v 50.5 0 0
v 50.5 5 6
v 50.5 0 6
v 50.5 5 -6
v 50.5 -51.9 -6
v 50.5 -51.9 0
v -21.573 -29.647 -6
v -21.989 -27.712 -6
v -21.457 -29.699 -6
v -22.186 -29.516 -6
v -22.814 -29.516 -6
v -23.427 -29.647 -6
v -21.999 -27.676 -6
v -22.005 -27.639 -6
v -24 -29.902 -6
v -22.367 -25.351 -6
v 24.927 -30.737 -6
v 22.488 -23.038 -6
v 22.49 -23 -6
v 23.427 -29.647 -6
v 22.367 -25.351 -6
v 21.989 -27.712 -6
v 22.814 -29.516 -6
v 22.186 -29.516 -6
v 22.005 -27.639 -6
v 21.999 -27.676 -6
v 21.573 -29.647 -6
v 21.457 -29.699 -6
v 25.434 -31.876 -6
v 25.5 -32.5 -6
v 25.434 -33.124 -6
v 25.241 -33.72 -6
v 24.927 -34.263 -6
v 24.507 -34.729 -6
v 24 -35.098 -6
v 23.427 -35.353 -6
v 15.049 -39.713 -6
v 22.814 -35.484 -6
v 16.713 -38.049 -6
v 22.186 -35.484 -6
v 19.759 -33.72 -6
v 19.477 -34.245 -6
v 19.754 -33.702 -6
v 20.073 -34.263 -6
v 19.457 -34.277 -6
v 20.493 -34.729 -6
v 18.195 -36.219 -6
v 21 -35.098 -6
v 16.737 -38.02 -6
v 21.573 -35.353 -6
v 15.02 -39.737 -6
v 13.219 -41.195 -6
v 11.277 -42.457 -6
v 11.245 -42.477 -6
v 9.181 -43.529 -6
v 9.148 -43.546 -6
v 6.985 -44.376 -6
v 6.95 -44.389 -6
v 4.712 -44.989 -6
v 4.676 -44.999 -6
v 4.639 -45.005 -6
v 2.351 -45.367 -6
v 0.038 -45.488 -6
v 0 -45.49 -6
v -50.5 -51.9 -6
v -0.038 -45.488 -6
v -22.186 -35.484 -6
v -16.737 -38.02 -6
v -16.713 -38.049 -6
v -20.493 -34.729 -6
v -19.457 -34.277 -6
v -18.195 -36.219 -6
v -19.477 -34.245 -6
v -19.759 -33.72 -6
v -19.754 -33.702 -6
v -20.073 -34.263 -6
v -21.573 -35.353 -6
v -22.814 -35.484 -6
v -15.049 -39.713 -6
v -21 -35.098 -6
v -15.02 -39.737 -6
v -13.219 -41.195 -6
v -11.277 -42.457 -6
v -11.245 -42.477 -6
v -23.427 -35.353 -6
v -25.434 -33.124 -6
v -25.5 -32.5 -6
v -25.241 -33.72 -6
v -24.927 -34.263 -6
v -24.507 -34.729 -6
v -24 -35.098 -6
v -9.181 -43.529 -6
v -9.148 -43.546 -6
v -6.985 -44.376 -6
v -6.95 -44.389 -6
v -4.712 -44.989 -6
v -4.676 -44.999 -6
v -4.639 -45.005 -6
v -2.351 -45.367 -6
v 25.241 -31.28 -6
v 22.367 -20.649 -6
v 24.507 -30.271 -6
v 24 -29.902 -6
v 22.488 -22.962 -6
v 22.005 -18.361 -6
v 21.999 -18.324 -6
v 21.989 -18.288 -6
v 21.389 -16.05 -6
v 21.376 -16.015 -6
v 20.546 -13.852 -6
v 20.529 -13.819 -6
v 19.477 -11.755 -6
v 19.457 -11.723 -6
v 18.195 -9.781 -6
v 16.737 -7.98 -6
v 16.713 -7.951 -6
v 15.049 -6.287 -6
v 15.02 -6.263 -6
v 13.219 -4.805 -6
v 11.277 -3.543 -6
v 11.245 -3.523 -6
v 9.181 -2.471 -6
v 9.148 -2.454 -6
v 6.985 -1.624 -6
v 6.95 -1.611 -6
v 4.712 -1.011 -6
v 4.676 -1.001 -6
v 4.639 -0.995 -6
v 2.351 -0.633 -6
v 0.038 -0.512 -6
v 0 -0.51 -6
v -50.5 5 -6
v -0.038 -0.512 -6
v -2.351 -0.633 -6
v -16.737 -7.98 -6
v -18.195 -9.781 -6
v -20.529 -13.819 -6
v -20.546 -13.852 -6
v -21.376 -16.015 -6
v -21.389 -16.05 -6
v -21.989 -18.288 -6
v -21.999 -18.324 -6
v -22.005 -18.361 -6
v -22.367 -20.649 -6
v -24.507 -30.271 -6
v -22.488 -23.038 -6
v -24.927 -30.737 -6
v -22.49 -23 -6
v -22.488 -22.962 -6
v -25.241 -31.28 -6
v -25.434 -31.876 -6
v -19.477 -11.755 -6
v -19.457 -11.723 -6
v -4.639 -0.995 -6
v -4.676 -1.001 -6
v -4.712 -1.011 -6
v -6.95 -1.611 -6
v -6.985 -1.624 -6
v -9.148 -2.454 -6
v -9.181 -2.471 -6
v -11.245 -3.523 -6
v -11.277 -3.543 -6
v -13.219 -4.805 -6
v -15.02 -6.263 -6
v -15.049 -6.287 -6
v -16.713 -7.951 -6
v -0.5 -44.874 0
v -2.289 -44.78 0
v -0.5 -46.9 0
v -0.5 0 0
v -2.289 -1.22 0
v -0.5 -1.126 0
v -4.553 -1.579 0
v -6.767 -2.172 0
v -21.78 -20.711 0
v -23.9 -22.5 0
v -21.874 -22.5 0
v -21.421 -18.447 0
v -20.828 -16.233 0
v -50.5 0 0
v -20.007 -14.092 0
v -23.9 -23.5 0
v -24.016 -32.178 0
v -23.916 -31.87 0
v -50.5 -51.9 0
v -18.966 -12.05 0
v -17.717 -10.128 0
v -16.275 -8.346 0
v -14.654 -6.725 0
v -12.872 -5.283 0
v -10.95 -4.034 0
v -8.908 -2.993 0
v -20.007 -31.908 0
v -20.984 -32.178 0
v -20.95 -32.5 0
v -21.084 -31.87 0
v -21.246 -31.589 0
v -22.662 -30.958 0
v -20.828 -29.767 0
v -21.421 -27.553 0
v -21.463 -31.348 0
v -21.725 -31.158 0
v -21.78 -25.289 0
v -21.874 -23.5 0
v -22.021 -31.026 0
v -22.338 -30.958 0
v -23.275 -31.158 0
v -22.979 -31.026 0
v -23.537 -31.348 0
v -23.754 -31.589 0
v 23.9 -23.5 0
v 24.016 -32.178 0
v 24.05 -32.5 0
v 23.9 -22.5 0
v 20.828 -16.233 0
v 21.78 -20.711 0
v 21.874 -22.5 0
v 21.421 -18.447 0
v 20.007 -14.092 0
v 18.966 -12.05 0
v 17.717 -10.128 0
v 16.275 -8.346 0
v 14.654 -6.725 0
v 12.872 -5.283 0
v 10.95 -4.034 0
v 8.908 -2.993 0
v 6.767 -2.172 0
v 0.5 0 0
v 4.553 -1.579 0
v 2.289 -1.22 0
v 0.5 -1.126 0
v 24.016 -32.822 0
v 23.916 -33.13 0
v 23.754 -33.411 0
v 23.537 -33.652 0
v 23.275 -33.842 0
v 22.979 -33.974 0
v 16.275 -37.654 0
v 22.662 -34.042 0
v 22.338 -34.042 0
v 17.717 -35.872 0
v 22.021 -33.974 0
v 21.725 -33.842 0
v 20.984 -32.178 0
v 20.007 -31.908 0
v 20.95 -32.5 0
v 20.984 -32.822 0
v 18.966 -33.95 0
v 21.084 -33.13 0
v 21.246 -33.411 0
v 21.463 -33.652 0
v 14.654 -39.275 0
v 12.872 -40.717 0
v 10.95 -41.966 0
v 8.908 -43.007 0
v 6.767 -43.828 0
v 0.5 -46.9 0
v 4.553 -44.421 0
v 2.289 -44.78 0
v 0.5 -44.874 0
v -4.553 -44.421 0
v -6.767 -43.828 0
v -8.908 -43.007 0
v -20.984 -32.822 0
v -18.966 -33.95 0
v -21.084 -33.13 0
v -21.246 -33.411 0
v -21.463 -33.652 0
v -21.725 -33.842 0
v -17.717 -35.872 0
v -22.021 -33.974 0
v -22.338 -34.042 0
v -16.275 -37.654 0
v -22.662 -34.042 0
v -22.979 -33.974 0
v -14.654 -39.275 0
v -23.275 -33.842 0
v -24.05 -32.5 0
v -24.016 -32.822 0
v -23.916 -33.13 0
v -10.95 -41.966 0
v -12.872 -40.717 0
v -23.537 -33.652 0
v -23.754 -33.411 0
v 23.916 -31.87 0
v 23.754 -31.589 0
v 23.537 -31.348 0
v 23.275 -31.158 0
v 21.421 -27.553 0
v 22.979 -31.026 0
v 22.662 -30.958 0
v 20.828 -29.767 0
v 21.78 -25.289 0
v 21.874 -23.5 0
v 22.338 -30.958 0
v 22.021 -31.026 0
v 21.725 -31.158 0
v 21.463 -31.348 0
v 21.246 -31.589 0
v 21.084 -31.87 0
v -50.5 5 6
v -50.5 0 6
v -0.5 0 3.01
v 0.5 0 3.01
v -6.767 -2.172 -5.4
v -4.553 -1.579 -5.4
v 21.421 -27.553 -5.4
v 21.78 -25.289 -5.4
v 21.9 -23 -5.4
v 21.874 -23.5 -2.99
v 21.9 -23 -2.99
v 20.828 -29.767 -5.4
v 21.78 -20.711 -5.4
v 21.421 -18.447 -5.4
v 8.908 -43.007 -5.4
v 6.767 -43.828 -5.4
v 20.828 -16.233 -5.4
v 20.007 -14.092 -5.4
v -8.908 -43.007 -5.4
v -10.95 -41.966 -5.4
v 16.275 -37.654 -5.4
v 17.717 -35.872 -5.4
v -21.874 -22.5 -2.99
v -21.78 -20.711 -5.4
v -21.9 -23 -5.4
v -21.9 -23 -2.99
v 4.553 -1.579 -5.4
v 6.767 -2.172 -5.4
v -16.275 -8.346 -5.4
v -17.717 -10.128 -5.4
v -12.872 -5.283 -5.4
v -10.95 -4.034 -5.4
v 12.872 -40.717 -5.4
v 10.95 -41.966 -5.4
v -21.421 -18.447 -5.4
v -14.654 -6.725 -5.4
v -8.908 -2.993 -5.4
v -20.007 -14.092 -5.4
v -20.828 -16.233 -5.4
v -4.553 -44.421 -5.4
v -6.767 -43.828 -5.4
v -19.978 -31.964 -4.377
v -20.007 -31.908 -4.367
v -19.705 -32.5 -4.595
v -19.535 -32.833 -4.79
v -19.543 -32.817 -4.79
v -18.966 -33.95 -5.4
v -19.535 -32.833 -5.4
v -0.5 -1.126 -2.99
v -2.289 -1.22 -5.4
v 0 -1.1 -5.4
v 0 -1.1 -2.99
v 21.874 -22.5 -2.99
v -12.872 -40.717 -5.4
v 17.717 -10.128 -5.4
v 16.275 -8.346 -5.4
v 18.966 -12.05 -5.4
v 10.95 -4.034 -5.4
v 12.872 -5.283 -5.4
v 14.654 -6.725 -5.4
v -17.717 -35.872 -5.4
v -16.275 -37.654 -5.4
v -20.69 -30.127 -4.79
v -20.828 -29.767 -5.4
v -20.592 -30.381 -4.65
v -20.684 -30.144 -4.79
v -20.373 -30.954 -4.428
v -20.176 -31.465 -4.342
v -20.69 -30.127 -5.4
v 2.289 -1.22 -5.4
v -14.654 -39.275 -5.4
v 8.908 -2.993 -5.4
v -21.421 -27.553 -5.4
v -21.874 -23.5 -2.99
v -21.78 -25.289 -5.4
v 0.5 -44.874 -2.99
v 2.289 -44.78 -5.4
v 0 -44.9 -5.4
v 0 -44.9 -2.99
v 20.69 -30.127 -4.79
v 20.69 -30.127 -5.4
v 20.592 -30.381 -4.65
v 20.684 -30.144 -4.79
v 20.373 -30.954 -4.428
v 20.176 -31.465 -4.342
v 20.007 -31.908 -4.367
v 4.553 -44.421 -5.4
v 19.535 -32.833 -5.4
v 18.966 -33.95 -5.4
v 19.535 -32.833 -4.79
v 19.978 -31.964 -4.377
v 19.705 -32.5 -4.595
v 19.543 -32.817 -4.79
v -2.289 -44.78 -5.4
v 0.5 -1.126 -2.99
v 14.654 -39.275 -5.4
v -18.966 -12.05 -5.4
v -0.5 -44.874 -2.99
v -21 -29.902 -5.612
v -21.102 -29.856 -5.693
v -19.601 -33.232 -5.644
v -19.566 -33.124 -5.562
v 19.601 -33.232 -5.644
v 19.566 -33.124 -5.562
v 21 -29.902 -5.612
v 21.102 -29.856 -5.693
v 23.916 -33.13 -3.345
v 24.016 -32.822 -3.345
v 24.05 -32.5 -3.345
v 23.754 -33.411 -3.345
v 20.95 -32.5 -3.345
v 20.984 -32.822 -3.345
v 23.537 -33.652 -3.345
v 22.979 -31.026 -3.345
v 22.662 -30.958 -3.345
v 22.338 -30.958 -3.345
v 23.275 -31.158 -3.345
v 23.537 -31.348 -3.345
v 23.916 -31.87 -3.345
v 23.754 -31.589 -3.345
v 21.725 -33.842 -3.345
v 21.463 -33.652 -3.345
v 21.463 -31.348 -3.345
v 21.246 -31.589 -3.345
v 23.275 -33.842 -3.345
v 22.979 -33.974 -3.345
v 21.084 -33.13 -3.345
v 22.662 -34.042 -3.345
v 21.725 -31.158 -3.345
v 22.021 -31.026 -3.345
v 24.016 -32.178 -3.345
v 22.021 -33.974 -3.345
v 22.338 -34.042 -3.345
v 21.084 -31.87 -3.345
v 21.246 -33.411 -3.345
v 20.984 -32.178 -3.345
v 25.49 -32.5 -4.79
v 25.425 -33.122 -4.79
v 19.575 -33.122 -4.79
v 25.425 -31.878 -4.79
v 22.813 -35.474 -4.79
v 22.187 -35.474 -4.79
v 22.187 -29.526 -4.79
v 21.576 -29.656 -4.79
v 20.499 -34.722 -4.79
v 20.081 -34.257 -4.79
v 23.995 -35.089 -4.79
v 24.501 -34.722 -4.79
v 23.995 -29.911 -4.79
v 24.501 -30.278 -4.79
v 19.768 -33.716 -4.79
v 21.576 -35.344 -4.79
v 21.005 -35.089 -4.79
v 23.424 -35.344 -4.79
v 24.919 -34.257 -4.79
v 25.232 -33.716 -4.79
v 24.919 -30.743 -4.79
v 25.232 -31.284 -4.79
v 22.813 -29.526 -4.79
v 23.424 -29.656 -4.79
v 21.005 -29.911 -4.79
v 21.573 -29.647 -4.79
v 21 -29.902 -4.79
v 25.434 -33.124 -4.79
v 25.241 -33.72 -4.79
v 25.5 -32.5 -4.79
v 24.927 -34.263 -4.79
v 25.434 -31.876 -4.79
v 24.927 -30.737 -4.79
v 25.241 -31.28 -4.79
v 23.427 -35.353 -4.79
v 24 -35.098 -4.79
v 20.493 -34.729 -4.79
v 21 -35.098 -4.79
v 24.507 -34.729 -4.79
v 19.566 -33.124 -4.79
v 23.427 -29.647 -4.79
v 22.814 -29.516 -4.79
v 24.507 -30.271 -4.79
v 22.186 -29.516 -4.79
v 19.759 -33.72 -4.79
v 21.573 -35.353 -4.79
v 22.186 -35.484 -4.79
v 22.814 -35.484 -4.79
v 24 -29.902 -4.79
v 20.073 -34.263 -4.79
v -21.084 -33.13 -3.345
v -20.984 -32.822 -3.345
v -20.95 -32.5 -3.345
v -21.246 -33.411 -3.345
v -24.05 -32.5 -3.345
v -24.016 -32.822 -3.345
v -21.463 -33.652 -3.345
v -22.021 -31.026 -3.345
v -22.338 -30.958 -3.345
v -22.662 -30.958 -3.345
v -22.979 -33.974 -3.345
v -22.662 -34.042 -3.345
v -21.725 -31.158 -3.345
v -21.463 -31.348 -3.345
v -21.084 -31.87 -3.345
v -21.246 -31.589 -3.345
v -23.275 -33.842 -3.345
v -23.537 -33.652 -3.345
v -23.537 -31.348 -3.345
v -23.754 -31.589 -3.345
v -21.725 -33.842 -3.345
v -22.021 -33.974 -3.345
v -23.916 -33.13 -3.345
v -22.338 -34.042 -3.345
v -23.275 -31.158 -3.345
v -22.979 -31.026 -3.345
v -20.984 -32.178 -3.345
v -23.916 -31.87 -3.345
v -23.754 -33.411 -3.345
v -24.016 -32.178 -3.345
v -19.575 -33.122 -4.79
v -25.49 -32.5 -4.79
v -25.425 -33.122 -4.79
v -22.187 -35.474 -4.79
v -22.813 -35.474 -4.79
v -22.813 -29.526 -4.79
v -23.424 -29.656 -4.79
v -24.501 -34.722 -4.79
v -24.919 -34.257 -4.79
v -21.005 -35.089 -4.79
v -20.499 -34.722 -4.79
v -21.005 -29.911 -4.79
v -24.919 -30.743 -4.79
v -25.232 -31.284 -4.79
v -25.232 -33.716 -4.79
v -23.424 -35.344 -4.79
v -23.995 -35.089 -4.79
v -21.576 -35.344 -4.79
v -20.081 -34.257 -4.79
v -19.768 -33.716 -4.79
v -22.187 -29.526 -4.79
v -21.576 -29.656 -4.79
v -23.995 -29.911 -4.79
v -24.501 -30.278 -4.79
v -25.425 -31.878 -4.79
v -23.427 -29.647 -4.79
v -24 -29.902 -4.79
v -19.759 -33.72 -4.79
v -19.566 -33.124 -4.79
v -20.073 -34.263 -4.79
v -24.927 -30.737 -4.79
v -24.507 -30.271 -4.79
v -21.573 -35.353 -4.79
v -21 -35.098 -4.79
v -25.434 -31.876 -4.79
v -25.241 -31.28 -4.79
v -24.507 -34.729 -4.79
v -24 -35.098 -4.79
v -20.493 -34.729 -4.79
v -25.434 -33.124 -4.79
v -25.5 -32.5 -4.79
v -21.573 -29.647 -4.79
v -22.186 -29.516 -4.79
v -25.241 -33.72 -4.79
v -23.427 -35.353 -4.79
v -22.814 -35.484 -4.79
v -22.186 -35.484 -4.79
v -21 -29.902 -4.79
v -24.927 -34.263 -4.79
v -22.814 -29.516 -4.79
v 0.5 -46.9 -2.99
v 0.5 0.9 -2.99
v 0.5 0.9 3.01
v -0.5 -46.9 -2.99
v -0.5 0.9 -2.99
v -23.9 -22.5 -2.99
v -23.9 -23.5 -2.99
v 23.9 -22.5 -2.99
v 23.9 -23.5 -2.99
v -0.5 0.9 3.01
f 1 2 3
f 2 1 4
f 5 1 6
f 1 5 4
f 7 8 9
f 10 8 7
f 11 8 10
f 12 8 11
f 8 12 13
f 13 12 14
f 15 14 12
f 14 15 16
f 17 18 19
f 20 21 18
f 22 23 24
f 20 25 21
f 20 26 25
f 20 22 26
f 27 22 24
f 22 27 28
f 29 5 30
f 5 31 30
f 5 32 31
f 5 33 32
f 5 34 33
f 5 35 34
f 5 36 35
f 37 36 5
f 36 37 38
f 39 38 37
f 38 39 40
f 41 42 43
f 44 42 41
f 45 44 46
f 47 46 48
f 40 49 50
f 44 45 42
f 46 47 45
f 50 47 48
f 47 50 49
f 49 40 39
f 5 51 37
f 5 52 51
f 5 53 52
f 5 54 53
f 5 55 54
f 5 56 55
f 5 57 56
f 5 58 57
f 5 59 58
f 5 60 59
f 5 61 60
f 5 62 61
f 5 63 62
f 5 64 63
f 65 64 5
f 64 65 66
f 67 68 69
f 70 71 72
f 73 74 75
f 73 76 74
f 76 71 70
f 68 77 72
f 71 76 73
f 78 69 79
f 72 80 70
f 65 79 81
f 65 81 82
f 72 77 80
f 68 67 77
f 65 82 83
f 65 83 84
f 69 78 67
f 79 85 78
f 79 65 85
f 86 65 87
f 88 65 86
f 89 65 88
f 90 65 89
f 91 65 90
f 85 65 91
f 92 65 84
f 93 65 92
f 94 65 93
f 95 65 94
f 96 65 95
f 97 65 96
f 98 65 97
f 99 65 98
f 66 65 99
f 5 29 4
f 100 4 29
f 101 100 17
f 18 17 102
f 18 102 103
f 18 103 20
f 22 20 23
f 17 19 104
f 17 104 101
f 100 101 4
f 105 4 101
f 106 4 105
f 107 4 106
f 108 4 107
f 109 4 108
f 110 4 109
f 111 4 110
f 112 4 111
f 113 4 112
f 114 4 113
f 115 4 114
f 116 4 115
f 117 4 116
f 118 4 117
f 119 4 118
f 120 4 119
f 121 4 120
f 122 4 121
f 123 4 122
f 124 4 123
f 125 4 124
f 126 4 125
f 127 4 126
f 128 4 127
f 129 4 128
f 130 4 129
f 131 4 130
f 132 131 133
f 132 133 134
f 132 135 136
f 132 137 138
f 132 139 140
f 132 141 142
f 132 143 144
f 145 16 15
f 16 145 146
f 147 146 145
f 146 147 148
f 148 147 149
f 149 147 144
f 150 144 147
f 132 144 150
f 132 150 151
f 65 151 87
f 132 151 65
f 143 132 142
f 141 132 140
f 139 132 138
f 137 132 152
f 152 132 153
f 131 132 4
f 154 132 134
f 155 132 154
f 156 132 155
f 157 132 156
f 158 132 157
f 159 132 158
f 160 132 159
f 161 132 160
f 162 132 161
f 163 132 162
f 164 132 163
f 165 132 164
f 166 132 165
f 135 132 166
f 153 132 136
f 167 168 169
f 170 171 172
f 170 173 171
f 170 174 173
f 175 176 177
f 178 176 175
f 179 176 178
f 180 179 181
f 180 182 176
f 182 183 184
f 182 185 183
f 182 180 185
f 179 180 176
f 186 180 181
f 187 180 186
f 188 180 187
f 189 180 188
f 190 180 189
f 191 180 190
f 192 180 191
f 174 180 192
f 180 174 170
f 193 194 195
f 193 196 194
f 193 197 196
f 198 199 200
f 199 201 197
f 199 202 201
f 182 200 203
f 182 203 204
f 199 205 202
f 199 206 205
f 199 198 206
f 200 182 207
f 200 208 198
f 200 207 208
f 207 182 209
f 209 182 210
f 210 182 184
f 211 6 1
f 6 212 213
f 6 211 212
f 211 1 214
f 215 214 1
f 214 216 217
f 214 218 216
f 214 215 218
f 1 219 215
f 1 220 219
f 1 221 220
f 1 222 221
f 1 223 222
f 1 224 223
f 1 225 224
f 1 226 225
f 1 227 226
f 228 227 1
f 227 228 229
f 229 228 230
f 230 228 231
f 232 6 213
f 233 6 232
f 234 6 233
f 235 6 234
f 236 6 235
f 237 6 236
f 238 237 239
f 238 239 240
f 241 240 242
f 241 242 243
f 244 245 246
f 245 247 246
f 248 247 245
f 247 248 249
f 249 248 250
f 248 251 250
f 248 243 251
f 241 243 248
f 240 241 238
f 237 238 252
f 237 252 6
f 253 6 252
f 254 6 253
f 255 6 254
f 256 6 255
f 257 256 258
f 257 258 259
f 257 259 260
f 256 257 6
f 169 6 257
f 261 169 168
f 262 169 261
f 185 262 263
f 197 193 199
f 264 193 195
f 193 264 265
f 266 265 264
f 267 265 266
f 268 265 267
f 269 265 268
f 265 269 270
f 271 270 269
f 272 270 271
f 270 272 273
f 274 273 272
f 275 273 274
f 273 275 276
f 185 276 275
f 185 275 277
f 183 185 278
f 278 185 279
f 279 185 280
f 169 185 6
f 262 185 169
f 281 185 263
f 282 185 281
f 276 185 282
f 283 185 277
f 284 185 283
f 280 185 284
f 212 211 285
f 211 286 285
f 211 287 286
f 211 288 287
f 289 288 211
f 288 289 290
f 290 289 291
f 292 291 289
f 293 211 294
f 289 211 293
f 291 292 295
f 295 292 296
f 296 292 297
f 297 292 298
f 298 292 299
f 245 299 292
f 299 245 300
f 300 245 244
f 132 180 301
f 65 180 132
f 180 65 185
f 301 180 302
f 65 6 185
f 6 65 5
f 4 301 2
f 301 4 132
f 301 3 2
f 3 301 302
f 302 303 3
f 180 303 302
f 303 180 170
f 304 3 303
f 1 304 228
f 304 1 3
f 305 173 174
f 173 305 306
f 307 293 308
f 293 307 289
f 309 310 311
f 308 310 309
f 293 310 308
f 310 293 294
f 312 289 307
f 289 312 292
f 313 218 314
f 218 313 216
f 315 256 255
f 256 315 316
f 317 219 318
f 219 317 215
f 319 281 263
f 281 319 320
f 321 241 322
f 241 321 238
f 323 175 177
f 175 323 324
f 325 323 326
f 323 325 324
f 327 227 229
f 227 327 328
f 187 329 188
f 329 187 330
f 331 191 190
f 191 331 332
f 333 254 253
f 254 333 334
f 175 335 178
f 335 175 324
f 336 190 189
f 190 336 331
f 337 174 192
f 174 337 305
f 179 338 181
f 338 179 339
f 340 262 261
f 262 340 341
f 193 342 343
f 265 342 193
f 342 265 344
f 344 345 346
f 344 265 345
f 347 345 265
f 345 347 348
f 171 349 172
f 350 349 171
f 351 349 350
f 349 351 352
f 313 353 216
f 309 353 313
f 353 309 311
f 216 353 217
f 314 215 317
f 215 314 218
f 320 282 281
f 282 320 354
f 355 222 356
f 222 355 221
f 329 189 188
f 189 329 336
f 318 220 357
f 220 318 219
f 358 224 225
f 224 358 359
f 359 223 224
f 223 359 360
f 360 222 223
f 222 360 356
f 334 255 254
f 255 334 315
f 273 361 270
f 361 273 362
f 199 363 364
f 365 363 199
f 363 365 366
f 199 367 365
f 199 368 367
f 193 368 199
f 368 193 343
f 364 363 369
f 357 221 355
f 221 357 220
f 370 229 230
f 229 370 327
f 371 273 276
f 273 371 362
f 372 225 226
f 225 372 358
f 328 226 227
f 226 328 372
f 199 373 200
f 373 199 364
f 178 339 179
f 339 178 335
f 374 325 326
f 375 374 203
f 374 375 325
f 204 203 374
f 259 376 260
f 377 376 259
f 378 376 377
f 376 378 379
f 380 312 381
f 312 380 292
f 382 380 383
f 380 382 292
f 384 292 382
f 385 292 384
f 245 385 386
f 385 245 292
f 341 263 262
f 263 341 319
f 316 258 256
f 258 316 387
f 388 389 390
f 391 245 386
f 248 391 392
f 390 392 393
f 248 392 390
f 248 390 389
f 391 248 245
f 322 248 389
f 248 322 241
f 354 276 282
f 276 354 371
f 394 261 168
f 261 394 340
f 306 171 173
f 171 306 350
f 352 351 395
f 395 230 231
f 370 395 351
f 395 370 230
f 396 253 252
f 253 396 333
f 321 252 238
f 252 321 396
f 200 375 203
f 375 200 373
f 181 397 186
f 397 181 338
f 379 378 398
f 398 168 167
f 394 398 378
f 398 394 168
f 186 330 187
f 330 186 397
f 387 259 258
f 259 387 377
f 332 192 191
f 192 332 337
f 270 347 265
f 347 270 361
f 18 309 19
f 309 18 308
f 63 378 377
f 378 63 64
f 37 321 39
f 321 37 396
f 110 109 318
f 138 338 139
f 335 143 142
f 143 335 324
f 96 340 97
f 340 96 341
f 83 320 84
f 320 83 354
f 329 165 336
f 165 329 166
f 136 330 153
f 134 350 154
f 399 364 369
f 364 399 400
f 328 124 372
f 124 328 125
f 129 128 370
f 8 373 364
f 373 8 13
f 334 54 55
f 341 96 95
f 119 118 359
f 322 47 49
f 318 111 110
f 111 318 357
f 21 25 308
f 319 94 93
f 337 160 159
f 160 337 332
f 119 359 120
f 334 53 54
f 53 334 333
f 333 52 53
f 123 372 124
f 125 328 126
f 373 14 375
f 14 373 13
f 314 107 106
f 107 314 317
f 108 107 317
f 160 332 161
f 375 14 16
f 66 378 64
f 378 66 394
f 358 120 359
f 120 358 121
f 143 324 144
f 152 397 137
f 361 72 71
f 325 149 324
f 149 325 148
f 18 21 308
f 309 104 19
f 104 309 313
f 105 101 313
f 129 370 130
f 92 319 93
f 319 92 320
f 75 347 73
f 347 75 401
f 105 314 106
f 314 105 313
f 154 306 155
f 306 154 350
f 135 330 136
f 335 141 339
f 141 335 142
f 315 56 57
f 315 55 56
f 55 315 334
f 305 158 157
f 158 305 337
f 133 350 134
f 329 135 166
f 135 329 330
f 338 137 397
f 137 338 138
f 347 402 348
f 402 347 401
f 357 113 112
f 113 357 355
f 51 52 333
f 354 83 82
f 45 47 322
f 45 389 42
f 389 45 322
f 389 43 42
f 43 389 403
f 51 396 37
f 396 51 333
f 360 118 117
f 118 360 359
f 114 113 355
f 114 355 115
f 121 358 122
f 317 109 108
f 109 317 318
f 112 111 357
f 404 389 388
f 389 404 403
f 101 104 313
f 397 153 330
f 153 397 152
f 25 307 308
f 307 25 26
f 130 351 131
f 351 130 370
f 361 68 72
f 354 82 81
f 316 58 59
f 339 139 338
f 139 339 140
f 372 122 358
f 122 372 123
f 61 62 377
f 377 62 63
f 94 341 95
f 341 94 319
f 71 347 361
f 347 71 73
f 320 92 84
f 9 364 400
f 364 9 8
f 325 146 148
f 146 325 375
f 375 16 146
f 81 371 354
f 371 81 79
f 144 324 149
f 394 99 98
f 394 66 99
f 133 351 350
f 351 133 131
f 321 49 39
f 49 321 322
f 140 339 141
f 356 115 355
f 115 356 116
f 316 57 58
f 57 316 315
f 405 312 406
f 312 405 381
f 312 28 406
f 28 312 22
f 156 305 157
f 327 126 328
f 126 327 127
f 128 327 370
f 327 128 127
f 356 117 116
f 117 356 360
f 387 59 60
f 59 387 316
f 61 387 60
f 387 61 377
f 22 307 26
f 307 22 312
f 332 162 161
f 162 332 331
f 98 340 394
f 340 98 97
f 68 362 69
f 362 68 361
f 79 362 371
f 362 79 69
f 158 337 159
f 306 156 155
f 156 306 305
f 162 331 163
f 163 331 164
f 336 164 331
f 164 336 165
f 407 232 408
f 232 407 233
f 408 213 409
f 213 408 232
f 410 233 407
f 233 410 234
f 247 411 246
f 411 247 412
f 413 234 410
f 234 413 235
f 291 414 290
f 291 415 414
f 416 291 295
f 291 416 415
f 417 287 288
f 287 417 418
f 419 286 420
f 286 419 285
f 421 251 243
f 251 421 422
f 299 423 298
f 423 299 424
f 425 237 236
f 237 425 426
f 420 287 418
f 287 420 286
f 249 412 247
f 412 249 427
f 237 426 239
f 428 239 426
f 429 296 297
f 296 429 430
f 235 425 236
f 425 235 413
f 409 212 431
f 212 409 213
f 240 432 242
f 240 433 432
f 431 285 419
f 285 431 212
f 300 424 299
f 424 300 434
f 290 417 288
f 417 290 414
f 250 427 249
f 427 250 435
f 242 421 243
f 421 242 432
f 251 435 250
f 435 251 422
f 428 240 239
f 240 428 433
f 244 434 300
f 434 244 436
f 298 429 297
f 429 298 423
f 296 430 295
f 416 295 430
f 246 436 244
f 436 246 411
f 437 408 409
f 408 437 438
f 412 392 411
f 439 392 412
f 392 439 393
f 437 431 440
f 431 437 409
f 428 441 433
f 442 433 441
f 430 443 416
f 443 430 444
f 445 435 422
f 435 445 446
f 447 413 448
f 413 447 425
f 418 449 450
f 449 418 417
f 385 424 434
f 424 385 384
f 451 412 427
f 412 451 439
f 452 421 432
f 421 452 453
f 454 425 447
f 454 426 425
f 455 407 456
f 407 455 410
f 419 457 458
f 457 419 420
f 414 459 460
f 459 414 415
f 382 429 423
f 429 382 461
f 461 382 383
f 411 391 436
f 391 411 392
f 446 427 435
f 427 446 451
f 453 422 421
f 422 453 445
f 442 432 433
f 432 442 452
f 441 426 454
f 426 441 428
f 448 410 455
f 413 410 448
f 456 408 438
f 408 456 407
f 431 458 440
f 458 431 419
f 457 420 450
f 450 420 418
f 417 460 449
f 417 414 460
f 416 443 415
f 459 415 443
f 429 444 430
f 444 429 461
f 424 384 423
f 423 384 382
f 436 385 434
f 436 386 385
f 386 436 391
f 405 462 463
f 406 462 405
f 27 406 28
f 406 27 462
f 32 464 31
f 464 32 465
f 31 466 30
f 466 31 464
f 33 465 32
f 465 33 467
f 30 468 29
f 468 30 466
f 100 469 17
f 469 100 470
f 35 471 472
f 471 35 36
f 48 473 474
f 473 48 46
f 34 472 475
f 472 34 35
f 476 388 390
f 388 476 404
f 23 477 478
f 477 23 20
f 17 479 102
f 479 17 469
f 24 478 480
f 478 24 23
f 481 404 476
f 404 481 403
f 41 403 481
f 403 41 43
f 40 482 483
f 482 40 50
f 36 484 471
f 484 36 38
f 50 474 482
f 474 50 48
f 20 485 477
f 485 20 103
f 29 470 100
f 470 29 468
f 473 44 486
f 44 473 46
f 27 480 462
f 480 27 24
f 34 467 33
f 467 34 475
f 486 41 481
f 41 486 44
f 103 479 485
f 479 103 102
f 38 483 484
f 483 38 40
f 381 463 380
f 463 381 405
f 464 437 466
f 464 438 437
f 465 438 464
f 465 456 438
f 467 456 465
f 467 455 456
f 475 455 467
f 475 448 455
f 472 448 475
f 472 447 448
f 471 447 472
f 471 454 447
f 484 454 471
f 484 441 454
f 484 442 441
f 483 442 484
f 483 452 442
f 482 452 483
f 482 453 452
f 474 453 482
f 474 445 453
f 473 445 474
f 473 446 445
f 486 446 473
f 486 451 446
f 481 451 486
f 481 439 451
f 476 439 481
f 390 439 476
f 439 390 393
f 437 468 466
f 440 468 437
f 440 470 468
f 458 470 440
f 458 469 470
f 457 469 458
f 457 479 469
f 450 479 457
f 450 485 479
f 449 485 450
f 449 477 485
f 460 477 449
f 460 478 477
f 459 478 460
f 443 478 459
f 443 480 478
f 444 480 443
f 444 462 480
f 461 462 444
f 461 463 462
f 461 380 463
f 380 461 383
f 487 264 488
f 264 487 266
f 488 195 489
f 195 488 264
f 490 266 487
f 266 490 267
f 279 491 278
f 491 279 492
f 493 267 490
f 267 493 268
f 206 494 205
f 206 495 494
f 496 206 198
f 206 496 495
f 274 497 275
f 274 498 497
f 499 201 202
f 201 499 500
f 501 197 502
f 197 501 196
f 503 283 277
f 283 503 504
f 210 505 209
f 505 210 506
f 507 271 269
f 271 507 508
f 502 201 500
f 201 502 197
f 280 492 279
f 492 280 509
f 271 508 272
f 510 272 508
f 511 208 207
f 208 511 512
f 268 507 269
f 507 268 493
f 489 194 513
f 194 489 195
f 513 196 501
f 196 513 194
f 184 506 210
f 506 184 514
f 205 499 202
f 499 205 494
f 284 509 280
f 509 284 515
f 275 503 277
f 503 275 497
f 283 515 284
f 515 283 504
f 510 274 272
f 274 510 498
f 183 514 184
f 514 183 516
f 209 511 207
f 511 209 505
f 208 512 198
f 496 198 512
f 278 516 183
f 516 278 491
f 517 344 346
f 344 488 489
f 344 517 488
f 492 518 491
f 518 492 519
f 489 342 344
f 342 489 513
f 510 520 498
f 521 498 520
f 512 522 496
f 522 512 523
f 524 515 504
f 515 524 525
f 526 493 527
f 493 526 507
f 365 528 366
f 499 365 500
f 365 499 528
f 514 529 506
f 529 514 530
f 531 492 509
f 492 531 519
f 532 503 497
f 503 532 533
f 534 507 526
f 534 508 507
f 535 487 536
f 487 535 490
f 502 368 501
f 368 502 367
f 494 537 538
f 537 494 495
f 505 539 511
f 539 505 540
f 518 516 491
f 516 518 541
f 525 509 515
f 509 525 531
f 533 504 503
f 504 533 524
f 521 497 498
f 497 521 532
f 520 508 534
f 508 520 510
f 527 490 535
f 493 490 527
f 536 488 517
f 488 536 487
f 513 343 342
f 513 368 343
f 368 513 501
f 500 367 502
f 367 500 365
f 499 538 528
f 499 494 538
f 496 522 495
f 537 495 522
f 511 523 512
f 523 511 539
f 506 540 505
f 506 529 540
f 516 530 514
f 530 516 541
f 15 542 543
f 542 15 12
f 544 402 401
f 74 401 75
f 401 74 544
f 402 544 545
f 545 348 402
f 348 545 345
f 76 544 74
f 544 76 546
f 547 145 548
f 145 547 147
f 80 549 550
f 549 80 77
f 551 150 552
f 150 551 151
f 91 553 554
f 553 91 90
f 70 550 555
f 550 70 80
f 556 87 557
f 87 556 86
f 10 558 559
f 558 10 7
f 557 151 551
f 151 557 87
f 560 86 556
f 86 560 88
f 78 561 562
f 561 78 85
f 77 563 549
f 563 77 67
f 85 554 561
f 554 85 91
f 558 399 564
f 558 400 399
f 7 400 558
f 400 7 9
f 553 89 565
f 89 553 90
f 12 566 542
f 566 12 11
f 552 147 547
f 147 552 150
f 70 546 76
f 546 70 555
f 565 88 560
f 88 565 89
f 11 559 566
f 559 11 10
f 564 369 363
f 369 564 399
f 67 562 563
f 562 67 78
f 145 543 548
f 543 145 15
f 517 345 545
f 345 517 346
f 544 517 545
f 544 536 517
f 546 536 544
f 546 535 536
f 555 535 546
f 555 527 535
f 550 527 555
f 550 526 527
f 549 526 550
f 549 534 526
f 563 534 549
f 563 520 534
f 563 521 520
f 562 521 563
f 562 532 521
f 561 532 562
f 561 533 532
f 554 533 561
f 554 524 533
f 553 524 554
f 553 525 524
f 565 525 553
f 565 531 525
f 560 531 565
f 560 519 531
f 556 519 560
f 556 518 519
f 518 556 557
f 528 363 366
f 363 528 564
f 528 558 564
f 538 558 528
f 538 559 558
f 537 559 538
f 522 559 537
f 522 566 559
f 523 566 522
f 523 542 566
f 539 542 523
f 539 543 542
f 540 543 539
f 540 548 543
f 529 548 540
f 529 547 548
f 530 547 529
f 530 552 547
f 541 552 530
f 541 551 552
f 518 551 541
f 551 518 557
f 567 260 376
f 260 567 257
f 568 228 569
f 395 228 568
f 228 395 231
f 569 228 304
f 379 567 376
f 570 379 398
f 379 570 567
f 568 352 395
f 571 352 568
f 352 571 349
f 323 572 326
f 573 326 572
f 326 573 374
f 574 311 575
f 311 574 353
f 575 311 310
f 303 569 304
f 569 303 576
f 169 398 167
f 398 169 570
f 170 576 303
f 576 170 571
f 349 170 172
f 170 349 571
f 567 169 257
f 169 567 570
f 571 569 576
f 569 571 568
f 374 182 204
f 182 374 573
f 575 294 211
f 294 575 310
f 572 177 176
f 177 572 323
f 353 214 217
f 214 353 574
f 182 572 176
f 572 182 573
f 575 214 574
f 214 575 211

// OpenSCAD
//
//  router pattern jig for concealed cabinet hinge mount
//
//  design by egil kvaleberg, 3 dec 2015
//
//  bug: 
//

// size of milling bit used on router
mill_dia = 9.5;  

// diameter of guide on router
guide_dia = 18.3; 

// jig main thickness 
guide_height = 6.0;

// width of support bar
guide_bar = 5.0; 

// chamfer of jig hole
guide_chamfer = 0.6; 

// hole in router plastic support plate, decides jig height
platform_dia = 60.0; 

// hole for hinge, usually 35, but 25 also exists
hinge_dia = 35.0; 

// hole centre offset to door edge, decides gap (20.5 to 24.5)
hinge_offset = 23.0; 

// hinge mount screw distance, usually 42, 45 or 48 
screw_dist = 45.0; 

// from hole centre, valid for 35mm hinge
screw_offset = 9.5; 

// for pilot drill and jig fixing screw, final hole should be approx 4.0
screw_dia = 3.1; 

// size of head of screw for temporary jig fixing
screw_head = 6.0; 

// width of notch indicating centre
index_notch = 1.0; 

/* [Hidden] */
tool_offset = (guide_dia-mill_dia)/2;
tool_dia = hinge_dia+tool_offset*2; // diameter of hole in tool
tool_height = max(platform_dia + hinge_dia + 6.0, hinge_dia+2*tool_offset+2*guide_bar); // make sure jig supports router plastic support plate
tool_width = hinge_offset+tool_dia/2+2*guide_height;

d = 0.01;

module tool() {
    translate([-tool_height/2, -guide_bar, 0]) cube(size=[tool_height, tool_width, guide_height]);
    translate([-tool_height/2, -guide_bar, -guide_height]) cube(size=[tool_height, guide_bar, guide_height+d]);
}

module hingehole() {
    translate([0, hinge_offset, -d]) {
        cylinder(d=tool_dia, h=guide_height+2*d, $fn=60);
        translate([0, 0, d+guide_height-guide_chamfer]) 
            cylinder(d1=tool_dia, d2=tool_dia+2*guide_chamfer, h=guide_chamfer+d, $fn=60);
    }
}

module screwholes() {
    recess = guide_height/5;
    for (s = [1, -1]) translate([s*screw_dist/2, hinge_offset+screw_offset, -d]) {
            cylinder(d=screw_dia, h=guide_height+2*d, $fn=30);
            translate([0, 0, guide_height-screw_head/2-recess]) cylinder(d1=0, d2=screw_head, h=screw_head/2+d, $fn=30);
            translate([0, 0, guide_height-recess]) cylinder(d=screw_head, h=recess+2*d, $fn=30);
    }
}

module index() {
    translate([0, hinge_offset, -d]) {
        for (a = [0, 90]) rotate([0, 0, a])
        cube(size=[index_notch, tool_dia+4*index_notch, guide_height], center=true); 
    }
}

rotate([180,0,0]) // for printing
difference () {
    tool();
    union () {
        hingehole();
        screwholes();
        index();
    }
}
